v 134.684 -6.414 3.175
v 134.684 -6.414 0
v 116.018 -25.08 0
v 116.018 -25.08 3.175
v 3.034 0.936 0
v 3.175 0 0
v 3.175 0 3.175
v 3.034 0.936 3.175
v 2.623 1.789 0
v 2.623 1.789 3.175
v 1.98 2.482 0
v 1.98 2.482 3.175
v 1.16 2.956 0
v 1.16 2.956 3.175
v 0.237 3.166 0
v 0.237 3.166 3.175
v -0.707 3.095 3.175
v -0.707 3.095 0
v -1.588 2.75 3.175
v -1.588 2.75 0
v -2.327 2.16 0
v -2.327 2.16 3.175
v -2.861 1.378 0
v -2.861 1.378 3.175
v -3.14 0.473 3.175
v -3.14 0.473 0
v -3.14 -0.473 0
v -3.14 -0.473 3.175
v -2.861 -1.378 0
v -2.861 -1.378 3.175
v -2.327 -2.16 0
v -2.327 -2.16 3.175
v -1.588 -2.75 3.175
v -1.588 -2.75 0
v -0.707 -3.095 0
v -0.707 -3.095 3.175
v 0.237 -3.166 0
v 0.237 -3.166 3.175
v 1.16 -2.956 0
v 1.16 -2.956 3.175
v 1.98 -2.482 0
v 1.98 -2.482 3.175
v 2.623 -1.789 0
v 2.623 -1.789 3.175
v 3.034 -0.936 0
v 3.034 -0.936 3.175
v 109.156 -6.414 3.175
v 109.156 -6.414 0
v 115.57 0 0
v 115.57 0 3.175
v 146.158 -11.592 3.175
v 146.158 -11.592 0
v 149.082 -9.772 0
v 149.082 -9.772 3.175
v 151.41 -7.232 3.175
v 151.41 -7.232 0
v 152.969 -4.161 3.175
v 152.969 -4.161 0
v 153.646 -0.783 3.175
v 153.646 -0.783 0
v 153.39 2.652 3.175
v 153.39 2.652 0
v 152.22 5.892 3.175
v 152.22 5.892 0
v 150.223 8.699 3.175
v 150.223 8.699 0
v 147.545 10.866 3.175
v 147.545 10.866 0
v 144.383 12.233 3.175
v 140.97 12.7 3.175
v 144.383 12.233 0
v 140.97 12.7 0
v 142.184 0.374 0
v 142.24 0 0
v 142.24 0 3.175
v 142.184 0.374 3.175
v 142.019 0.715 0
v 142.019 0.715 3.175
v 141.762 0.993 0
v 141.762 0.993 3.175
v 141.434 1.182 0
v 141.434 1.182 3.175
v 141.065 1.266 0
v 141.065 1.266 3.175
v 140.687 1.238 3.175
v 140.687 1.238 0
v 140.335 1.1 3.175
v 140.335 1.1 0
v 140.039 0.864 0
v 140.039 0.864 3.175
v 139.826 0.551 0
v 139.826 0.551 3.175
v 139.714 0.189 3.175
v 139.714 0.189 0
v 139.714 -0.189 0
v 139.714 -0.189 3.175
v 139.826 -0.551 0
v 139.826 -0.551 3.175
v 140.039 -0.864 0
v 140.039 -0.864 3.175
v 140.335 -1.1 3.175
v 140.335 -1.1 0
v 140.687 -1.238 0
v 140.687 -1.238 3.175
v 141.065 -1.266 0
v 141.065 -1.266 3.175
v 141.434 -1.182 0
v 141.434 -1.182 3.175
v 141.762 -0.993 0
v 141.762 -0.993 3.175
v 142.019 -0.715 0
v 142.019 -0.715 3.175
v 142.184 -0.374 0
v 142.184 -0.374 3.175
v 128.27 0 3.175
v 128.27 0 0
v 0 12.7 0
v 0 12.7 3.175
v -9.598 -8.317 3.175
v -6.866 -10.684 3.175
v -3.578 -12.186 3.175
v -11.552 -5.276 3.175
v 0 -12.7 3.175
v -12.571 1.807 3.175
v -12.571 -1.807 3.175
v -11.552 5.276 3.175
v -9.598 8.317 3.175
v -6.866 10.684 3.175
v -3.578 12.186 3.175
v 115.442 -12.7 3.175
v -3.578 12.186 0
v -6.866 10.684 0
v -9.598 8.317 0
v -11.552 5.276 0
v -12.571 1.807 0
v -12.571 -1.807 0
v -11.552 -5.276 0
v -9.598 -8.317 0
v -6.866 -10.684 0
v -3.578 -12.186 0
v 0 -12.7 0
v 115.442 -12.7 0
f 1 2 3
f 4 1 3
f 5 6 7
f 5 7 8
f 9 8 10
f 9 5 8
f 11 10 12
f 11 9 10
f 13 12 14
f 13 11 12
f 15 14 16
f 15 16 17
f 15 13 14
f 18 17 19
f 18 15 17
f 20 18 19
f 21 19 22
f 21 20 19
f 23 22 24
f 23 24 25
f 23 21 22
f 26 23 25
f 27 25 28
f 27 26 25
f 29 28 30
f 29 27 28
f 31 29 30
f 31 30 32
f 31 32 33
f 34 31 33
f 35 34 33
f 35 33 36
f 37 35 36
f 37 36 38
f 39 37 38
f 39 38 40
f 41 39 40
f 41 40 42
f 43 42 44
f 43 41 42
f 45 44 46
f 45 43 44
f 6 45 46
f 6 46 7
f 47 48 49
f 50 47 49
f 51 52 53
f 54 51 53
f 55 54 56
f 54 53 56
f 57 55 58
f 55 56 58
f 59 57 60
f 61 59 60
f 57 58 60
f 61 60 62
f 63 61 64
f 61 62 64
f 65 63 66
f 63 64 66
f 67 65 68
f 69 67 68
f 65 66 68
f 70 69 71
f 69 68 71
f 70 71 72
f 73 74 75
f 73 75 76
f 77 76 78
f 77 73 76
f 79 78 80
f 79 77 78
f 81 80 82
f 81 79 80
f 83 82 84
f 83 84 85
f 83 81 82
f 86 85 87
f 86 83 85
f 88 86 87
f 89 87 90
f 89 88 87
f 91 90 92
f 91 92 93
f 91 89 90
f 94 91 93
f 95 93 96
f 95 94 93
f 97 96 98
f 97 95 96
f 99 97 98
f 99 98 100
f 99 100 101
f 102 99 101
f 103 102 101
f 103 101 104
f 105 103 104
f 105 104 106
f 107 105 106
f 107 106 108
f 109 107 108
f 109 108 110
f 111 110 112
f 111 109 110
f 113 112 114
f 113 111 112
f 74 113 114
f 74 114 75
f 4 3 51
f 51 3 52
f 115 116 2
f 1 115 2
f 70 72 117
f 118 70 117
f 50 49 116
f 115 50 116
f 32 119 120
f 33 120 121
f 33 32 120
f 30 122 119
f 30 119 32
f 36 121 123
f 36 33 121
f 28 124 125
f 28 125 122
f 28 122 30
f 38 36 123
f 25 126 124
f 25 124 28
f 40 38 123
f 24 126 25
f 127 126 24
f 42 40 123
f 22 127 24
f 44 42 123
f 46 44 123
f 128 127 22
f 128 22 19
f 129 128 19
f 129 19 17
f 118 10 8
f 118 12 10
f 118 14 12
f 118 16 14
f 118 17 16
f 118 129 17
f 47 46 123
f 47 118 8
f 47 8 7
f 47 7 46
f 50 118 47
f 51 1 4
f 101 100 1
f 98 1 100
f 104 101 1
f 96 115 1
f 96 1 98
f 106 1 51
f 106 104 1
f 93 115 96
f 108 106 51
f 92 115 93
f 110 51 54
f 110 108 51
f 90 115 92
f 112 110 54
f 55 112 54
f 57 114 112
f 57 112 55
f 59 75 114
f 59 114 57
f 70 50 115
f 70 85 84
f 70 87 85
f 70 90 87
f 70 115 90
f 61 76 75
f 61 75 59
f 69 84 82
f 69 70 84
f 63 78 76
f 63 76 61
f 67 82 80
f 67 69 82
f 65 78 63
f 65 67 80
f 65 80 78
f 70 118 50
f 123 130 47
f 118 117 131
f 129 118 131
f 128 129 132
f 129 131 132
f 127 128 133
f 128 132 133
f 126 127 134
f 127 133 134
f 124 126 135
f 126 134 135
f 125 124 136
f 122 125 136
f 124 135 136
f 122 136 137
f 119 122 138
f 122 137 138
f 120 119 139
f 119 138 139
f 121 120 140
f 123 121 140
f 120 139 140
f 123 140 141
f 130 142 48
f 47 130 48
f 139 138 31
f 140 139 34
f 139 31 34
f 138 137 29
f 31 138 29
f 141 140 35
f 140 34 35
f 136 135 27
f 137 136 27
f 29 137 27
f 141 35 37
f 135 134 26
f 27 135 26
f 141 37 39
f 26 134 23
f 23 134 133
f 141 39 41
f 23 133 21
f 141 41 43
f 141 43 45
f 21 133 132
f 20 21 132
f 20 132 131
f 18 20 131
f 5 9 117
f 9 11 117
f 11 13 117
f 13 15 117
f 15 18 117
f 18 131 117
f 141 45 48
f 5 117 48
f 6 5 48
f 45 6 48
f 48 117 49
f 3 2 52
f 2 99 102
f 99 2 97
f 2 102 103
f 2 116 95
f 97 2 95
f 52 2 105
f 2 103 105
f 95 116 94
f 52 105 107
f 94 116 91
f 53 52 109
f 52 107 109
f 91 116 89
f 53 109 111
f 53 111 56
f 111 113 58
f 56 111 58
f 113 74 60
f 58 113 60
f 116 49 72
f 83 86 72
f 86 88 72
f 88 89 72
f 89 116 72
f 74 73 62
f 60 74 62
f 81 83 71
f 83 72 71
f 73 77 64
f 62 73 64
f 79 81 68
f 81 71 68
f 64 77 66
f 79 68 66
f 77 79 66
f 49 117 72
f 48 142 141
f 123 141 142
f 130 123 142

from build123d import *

# Parameters (mm, degrees)
SKETCH1_R           = 3.175
SKETCH1_R_2         = 1.27
BOSS_EXTRUDE1_DEPTH = 3.175


with BuildPart() as part:
    # Sketch1 → Boss-Extrude1 (new body)
    with BuildSketch(Plane.XY):
        with BuildLine():
            Line((115.57, 0), (128.27, 0))
            Line((128.27, 0), (134.683820715, -6.413820715))
            Line((134.683820715, -6.413820715), (116.017803308, -25.079838122))
            Line((116.017803308, -25.079838122), (146.157549282, -11.59220999))
            ThreePointArc((146.157549282, -11.59220999), (153.389965114, 2.652256881), (140.97, 12.7))
            Line((140.97, 12.7), (0, 12.7))
            ThreePointArc((0, 12.7), (-12.7, 0), (0, -12.7))
            Line((0, -12.7), (115.442358569, -12.7))
            Line((115.442358569, -12.7), (109.156179285, -6.413820715))
            Line((109.156179285, -6.413820715), (115.57, 0))
        make_face()
        Circle(SKETCH1_R, mode=Mode.SUBTRACT)
        with Locations((140.97, 0)):
            Circle(SKETCH1_R_2, mode=Mode.SUBTRACT)
    extrude(amount=BOSS_EXTRUDE1_DEPTH)


solid = part.part
